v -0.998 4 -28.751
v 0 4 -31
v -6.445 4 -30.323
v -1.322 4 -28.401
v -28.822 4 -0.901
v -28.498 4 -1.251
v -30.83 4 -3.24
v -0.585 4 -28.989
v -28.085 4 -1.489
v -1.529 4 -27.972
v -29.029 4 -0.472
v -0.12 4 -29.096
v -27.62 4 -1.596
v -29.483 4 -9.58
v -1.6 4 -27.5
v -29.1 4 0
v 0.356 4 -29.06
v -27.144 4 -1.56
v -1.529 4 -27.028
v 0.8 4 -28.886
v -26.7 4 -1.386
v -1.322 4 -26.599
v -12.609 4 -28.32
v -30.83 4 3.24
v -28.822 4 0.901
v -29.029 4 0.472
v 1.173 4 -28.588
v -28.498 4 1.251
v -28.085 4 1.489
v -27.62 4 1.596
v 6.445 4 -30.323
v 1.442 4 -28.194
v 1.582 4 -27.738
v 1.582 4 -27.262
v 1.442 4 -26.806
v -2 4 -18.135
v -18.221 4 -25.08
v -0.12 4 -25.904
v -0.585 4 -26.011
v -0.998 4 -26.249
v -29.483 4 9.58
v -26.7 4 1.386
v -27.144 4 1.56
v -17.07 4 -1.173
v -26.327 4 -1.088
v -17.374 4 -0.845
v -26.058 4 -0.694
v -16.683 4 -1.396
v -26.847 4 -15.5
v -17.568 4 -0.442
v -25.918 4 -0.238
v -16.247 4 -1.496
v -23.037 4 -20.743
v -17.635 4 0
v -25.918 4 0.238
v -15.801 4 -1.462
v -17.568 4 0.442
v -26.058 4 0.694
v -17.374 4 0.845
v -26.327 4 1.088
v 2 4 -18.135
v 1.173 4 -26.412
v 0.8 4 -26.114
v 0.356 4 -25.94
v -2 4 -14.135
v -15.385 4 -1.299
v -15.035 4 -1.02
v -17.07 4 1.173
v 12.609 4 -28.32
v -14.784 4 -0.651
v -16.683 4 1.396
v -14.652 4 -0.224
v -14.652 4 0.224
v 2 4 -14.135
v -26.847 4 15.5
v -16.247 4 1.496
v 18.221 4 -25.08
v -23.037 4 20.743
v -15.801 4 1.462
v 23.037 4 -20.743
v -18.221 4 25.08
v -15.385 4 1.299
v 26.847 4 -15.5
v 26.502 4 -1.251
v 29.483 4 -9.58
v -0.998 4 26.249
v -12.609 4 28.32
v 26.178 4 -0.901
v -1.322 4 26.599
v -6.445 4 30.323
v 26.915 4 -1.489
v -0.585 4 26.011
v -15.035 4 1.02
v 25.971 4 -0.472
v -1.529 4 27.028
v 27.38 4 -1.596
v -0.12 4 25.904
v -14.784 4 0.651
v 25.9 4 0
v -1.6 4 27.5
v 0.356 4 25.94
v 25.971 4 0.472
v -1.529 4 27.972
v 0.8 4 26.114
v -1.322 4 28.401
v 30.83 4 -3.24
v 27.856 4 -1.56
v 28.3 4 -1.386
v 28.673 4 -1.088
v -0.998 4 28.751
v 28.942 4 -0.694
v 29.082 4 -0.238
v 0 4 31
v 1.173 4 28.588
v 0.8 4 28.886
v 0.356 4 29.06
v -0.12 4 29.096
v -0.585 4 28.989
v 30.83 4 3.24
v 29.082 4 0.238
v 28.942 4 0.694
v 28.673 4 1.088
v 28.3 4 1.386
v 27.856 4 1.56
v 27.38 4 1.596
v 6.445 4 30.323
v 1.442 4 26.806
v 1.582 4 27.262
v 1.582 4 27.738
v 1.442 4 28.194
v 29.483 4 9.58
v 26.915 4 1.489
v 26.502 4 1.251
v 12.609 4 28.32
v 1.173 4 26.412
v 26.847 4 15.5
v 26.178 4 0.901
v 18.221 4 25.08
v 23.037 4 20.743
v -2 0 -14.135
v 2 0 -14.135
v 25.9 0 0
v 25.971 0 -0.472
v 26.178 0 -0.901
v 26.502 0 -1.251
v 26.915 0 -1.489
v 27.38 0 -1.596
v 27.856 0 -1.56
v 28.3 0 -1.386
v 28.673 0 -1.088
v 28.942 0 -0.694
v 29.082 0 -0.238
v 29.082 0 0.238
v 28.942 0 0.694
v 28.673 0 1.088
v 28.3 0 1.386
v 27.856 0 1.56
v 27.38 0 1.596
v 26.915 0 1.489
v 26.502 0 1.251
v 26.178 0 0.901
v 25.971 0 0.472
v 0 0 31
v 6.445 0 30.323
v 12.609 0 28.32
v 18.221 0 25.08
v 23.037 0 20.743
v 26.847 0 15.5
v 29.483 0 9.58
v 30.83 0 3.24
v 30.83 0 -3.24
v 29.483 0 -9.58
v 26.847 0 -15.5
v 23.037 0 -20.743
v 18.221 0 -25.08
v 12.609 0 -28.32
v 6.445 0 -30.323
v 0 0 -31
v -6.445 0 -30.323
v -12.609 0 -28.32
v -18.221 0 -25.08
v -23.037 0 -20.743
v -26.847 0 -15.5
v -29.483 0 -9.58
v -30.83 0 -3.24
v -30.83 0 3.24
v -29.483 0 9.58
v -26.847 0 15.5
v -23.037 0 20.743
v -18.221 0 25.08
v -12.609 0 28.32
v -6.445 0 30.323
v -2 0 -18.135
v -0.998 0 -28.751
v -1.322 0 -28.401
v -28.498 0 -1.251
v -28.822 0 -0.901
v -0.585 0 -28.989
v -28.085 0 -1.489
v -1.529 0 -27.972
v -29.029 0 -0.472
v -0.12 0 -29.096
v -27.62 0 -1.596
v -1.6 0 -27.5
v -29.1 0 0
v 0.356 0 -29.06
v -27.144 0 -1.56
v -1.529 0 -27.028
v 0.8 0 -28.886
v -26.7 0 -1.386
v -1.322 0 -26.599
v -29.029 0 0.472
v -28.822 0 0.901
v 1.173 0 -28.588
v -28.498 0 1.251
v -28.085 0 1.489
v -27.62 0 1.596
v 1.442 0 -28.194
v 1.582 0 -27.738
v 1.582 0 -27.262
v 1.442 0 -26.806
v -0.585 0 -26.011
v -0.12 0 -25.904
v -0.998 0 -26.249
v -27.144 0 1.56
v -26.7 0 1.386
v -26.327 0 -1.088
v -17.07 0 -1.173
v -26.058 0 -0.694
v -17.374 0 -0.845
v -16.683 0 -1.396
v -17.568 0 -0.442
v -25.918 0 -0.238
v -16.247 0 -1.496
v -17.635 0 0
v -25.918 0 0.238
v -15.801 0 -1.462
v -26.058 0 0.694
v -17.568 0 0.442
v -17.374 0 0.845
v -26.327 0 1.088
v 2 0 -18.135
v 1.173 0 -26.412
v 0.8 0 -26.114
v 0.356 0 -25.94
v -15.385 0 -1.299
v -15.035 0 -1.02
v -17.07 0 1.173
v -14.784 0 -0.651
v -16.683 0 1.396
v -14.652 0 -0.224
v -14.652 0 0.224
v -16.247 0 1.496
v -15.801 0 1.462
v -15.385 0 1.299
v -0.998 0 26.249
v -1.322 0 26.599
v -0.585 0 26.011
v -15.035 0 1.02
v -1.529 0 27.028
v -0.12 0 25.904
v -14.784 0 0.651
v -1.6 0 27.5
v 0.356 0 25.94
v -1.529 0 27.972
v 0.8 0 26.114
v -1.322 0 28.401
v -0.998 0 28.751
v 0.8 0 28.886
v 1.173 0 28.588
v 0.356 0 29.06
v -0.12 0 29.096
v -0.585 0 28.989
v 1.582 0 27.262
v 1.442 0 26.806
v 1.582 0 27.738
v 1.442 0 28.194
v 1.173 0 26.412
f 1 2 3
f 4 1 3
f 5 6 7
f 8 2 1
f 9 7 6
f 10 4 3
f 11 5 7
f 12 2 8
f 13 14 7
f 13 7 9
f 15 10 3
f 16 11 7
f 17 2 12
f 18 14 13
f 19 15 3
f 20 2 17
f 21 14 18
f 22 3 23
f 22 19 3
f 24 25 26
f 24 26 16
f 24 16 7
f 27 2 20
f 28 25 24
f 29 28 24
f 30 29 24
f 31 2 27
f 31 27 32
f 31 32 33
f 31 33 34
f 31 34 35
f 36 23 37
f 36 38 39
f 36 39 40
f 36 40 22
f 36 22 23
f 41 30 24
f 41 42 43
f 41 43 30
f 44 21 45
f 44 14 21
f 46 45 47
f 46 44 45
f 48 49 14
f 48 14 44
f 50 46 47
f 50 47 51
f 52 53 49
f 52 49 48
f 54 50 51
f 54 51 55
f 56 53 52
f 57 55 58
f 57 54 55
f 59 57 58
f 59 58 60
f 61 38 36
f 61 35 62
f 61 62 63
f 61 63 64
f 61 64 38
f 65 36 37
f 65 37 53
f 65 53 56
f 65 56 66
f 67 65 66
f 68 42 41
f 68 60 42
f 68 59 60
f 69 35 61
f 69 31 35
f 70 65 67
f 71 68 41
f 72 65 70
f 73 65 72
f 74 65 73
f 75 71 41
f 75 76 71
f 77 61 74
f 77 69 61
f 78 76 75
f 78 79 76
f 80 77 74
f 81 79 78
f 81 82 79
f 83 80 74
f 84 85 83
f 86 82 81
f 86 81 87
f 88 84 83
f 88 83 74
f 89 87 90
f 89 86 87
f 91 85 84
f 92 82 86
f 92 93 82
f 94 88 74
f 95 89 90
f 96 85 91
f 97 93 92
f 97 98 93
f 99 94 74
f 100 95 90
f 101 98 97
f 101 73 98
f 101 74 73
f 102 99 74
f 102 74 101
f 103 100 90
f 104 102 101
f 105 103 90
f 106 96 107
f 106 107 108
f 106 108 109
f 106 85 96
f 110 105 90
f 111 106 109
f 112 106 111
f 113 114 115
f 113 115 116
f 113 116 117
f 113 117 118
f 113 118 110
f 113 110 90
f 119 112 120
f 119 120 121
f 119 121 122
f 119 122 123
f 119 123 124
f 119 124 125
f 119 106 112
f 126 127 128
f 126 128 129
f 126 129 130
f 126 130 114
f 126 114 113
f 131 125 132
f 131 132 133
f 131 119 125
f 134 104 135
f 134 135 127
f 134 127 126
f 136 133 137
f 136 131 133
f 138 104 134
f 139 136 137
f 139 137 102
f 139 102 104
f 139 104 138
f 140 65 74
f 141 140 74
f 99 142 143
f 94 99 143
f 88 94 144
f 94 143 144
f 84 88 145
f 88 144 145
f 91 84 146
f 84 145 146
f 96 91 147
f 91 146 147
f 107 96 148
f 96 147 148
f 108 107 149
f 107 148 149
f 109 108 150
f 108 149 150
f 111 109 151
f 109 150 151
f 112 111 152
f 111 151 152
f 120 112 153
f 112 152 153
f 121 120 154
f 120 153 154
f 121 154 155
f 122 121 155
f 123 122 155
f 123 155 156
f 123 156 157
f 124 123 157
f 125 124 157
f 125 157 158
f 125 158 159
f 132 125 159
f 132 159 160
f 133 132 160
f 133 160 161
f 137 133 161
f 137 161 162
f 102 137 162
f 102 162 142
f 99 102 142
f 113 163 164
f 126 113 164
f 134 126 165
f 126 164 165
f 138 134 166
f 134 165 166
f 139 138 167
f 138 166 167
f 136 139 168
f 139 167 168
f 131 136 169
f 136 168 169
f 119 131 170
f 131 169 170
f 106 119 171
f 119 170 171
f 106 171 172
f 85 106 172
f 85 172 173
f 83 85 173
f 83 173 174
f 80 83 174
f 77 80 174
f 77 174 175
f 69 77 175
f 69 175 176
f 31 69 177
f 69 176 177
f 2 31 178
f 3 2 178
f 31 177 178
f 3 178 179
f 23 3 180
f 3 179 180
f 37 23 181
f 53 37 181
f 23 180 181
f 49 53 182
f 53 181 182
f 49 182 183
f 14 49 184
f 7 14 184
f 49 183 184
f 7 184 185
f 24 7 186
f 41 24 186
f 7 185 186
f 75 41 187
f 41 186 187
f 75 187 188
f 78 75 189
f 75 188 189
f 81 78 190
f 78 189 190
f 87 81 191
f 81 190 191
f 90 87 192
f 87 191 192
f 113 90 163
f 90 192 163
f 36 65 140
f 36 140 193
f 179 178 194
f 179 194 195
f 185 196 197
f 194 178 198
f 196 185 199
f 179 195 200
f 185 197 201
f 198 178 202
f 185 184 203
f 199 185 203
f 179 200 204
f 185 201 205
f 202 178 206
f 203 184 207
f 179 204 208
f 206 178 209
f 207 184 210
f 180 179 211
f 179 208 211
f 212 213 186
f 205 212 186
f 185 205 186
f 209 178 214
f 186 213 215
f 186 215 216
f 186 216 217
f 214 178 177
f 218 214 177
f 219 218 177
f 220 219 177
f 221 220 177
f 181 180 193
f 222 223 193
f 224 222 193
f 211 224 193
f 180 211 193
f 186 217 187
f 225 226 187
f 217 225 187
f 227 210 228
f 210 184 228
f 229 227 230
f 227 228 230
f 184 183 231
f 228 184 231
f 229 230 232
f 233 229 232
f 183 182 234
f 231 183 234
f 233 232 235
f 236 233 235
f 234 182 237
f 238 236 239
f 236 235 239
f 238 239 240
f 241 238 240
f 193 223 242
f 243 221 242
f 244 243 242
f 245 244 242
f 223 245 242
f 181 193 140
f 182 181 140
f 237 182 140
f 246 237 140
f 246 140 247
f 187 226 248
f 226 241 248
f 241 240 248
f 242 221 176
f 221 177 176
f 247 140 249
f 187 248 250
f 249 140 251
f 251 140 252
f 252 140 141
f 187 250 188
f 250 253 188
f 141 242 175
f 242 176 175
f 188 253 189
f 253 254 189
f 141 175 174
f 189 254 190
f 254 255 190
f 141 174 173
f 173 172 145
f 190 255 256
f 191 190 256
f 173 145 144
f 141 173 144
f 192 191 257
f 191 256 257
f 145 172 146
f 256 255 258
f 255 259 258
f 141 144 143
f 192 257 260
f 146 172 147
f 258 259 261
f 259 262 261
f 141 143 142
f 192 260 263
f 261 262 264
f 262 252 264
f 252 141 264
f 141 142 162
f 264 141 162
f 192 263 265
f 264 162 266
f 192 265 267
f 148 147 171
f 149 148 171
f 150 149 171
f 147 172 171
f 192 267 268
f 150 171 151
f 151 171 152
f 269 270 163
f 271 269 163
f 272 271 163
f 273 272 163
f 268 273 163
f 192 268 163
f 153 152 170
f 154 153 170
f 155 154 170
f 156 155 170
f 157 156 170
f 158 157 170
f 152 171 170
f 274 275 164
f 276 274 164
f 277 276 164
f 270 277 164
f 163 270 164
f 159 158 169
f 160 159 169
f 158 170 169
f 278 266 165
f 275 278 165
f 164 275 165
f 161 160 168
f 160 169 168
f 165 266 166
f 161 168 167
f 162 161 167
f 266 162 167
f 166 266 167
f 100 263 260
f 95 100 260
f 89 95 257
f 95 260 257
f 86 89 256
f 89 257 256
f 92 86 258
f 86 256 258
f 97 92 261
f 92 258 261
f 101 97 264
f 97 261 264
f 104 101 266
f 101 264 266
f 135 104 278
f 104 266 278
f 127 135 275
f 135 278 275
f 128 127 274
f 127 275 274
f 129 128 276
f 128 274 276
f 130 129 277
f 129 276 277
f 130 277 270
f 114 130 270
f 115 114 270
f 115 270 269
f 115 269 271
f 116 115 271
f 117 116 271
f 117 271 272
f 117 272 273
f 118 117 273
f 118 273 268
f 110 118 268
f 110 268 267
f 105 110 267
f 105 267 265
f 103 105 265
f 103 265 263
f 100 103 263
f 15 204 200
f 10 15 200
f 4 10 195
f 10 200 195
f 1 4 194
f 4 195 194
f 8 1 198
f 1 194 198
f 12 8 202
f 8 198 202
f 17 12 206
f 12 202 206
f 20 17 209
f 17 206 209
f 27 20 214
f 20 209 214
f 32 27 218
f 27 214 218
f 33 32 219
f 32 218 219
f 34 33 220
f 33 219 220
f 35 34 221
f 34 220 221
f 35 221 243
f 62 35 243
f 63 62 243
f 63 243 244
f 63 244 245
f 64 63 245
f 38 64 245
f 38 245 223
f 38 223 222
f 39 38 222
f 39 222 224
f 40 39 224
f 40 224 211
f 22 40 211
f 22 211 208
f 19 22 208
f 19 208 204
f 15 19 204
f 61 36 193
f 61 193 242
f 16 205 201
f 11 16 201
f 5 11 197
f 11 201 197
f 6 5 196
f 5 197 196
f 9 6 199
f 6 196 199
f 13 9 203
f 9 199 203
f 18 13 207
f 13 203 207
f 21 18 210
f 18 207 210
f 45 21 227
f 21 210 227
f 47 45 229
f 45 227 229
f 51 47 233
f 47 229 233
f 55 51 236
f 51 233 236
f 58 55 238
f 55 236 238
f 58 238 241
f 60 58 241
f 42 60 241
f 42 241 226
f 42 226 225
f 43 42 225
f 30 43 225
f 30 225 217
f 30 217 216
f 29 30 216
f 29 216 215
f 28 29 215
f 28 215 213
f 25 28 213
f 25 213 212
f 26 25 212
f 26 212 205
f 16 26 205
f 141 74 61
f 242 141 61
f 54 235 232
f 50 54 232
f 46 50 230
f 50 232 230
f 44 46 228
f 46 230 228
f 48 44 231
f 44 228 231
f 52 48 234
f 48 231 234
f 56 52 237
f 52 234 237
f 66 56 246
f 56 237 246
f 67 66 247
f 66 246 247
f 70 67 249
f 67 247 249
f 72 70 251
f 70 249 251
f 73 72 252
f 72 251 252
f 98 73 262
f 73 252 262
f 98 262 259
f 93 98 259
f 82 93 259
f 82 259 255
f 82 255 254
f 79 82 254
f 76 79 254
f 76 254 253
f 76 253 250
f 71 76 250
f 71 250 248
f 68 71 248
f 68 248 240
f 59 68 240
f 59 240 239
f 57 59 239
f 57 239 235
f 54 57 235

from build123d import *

# Parameters (mm, degrees)
SKETCH1_R                  = 31
BOSS_EXTRUDE1_DEPTH        = 4
F_3_2_3_2_DIAMETER_HOLE1_D = 3.2
F_3_0_3_DIAMETER_HOLE1_D   = 3
SKETCH6_W                  = 4
SKETCH6_H                  = 4
CUT_EXTRUDE2_DEPTH         = 45.022721406


with BuildPart() as part:
    # Sketch1 → Boss-Extrude1 (new body)
    with BuildSketch(Plane(origin=(0, 0, 0), x_dir=(1, 0, 0), z_dir=(0, 1, 0))):
        with Locations(Location((0, 0, 0), (0, 0, 270))):
            Circle(SKETCH1_R)
    extrude(amount=BOSS_EXTRUDE1_DEPTH)

    # Ø3.2 (3.2) Diameter Hole1 (through all)
    with Locations(Plane(origin=(0, 4, 0), x_dir=(1, 0, 0), z_dir=(0, 1, 0))):
        with Locations((-27.5, 0), (27.5, 0), (0, 27.5), (0, -27.5)):
            Hole(F_3_2_3_2_DIAMETER_HOLE1_D / 2)

    # Ø3.0 (3) Diameter Hole1 (through all)
    with Locations(Plane(origin=(0, 4, 0), x_dir=(1, 0, 0), z_dir=(0, 1, 0))):
        with Locations((-16.135, 0)):
            Hole(F_3_0_3_DIAMETER_HOLE1_D / 2)

    # Sketch6 → Cut-Extrude2 (cut, through all)
    with BuildSketch(Plane(origin=(0, 4, 0), x_dir=(1, 0, 0), z_dir=(0, 1, 0))):
        with Locations((0, 16.135)):
            Rectangle(SKETCH6_W, SKETCH6_H)
    extrude(amount=-CUT_EXTRUDE2_DEPTH, mode=Mode.SUBTRACT)


solid = part.part
